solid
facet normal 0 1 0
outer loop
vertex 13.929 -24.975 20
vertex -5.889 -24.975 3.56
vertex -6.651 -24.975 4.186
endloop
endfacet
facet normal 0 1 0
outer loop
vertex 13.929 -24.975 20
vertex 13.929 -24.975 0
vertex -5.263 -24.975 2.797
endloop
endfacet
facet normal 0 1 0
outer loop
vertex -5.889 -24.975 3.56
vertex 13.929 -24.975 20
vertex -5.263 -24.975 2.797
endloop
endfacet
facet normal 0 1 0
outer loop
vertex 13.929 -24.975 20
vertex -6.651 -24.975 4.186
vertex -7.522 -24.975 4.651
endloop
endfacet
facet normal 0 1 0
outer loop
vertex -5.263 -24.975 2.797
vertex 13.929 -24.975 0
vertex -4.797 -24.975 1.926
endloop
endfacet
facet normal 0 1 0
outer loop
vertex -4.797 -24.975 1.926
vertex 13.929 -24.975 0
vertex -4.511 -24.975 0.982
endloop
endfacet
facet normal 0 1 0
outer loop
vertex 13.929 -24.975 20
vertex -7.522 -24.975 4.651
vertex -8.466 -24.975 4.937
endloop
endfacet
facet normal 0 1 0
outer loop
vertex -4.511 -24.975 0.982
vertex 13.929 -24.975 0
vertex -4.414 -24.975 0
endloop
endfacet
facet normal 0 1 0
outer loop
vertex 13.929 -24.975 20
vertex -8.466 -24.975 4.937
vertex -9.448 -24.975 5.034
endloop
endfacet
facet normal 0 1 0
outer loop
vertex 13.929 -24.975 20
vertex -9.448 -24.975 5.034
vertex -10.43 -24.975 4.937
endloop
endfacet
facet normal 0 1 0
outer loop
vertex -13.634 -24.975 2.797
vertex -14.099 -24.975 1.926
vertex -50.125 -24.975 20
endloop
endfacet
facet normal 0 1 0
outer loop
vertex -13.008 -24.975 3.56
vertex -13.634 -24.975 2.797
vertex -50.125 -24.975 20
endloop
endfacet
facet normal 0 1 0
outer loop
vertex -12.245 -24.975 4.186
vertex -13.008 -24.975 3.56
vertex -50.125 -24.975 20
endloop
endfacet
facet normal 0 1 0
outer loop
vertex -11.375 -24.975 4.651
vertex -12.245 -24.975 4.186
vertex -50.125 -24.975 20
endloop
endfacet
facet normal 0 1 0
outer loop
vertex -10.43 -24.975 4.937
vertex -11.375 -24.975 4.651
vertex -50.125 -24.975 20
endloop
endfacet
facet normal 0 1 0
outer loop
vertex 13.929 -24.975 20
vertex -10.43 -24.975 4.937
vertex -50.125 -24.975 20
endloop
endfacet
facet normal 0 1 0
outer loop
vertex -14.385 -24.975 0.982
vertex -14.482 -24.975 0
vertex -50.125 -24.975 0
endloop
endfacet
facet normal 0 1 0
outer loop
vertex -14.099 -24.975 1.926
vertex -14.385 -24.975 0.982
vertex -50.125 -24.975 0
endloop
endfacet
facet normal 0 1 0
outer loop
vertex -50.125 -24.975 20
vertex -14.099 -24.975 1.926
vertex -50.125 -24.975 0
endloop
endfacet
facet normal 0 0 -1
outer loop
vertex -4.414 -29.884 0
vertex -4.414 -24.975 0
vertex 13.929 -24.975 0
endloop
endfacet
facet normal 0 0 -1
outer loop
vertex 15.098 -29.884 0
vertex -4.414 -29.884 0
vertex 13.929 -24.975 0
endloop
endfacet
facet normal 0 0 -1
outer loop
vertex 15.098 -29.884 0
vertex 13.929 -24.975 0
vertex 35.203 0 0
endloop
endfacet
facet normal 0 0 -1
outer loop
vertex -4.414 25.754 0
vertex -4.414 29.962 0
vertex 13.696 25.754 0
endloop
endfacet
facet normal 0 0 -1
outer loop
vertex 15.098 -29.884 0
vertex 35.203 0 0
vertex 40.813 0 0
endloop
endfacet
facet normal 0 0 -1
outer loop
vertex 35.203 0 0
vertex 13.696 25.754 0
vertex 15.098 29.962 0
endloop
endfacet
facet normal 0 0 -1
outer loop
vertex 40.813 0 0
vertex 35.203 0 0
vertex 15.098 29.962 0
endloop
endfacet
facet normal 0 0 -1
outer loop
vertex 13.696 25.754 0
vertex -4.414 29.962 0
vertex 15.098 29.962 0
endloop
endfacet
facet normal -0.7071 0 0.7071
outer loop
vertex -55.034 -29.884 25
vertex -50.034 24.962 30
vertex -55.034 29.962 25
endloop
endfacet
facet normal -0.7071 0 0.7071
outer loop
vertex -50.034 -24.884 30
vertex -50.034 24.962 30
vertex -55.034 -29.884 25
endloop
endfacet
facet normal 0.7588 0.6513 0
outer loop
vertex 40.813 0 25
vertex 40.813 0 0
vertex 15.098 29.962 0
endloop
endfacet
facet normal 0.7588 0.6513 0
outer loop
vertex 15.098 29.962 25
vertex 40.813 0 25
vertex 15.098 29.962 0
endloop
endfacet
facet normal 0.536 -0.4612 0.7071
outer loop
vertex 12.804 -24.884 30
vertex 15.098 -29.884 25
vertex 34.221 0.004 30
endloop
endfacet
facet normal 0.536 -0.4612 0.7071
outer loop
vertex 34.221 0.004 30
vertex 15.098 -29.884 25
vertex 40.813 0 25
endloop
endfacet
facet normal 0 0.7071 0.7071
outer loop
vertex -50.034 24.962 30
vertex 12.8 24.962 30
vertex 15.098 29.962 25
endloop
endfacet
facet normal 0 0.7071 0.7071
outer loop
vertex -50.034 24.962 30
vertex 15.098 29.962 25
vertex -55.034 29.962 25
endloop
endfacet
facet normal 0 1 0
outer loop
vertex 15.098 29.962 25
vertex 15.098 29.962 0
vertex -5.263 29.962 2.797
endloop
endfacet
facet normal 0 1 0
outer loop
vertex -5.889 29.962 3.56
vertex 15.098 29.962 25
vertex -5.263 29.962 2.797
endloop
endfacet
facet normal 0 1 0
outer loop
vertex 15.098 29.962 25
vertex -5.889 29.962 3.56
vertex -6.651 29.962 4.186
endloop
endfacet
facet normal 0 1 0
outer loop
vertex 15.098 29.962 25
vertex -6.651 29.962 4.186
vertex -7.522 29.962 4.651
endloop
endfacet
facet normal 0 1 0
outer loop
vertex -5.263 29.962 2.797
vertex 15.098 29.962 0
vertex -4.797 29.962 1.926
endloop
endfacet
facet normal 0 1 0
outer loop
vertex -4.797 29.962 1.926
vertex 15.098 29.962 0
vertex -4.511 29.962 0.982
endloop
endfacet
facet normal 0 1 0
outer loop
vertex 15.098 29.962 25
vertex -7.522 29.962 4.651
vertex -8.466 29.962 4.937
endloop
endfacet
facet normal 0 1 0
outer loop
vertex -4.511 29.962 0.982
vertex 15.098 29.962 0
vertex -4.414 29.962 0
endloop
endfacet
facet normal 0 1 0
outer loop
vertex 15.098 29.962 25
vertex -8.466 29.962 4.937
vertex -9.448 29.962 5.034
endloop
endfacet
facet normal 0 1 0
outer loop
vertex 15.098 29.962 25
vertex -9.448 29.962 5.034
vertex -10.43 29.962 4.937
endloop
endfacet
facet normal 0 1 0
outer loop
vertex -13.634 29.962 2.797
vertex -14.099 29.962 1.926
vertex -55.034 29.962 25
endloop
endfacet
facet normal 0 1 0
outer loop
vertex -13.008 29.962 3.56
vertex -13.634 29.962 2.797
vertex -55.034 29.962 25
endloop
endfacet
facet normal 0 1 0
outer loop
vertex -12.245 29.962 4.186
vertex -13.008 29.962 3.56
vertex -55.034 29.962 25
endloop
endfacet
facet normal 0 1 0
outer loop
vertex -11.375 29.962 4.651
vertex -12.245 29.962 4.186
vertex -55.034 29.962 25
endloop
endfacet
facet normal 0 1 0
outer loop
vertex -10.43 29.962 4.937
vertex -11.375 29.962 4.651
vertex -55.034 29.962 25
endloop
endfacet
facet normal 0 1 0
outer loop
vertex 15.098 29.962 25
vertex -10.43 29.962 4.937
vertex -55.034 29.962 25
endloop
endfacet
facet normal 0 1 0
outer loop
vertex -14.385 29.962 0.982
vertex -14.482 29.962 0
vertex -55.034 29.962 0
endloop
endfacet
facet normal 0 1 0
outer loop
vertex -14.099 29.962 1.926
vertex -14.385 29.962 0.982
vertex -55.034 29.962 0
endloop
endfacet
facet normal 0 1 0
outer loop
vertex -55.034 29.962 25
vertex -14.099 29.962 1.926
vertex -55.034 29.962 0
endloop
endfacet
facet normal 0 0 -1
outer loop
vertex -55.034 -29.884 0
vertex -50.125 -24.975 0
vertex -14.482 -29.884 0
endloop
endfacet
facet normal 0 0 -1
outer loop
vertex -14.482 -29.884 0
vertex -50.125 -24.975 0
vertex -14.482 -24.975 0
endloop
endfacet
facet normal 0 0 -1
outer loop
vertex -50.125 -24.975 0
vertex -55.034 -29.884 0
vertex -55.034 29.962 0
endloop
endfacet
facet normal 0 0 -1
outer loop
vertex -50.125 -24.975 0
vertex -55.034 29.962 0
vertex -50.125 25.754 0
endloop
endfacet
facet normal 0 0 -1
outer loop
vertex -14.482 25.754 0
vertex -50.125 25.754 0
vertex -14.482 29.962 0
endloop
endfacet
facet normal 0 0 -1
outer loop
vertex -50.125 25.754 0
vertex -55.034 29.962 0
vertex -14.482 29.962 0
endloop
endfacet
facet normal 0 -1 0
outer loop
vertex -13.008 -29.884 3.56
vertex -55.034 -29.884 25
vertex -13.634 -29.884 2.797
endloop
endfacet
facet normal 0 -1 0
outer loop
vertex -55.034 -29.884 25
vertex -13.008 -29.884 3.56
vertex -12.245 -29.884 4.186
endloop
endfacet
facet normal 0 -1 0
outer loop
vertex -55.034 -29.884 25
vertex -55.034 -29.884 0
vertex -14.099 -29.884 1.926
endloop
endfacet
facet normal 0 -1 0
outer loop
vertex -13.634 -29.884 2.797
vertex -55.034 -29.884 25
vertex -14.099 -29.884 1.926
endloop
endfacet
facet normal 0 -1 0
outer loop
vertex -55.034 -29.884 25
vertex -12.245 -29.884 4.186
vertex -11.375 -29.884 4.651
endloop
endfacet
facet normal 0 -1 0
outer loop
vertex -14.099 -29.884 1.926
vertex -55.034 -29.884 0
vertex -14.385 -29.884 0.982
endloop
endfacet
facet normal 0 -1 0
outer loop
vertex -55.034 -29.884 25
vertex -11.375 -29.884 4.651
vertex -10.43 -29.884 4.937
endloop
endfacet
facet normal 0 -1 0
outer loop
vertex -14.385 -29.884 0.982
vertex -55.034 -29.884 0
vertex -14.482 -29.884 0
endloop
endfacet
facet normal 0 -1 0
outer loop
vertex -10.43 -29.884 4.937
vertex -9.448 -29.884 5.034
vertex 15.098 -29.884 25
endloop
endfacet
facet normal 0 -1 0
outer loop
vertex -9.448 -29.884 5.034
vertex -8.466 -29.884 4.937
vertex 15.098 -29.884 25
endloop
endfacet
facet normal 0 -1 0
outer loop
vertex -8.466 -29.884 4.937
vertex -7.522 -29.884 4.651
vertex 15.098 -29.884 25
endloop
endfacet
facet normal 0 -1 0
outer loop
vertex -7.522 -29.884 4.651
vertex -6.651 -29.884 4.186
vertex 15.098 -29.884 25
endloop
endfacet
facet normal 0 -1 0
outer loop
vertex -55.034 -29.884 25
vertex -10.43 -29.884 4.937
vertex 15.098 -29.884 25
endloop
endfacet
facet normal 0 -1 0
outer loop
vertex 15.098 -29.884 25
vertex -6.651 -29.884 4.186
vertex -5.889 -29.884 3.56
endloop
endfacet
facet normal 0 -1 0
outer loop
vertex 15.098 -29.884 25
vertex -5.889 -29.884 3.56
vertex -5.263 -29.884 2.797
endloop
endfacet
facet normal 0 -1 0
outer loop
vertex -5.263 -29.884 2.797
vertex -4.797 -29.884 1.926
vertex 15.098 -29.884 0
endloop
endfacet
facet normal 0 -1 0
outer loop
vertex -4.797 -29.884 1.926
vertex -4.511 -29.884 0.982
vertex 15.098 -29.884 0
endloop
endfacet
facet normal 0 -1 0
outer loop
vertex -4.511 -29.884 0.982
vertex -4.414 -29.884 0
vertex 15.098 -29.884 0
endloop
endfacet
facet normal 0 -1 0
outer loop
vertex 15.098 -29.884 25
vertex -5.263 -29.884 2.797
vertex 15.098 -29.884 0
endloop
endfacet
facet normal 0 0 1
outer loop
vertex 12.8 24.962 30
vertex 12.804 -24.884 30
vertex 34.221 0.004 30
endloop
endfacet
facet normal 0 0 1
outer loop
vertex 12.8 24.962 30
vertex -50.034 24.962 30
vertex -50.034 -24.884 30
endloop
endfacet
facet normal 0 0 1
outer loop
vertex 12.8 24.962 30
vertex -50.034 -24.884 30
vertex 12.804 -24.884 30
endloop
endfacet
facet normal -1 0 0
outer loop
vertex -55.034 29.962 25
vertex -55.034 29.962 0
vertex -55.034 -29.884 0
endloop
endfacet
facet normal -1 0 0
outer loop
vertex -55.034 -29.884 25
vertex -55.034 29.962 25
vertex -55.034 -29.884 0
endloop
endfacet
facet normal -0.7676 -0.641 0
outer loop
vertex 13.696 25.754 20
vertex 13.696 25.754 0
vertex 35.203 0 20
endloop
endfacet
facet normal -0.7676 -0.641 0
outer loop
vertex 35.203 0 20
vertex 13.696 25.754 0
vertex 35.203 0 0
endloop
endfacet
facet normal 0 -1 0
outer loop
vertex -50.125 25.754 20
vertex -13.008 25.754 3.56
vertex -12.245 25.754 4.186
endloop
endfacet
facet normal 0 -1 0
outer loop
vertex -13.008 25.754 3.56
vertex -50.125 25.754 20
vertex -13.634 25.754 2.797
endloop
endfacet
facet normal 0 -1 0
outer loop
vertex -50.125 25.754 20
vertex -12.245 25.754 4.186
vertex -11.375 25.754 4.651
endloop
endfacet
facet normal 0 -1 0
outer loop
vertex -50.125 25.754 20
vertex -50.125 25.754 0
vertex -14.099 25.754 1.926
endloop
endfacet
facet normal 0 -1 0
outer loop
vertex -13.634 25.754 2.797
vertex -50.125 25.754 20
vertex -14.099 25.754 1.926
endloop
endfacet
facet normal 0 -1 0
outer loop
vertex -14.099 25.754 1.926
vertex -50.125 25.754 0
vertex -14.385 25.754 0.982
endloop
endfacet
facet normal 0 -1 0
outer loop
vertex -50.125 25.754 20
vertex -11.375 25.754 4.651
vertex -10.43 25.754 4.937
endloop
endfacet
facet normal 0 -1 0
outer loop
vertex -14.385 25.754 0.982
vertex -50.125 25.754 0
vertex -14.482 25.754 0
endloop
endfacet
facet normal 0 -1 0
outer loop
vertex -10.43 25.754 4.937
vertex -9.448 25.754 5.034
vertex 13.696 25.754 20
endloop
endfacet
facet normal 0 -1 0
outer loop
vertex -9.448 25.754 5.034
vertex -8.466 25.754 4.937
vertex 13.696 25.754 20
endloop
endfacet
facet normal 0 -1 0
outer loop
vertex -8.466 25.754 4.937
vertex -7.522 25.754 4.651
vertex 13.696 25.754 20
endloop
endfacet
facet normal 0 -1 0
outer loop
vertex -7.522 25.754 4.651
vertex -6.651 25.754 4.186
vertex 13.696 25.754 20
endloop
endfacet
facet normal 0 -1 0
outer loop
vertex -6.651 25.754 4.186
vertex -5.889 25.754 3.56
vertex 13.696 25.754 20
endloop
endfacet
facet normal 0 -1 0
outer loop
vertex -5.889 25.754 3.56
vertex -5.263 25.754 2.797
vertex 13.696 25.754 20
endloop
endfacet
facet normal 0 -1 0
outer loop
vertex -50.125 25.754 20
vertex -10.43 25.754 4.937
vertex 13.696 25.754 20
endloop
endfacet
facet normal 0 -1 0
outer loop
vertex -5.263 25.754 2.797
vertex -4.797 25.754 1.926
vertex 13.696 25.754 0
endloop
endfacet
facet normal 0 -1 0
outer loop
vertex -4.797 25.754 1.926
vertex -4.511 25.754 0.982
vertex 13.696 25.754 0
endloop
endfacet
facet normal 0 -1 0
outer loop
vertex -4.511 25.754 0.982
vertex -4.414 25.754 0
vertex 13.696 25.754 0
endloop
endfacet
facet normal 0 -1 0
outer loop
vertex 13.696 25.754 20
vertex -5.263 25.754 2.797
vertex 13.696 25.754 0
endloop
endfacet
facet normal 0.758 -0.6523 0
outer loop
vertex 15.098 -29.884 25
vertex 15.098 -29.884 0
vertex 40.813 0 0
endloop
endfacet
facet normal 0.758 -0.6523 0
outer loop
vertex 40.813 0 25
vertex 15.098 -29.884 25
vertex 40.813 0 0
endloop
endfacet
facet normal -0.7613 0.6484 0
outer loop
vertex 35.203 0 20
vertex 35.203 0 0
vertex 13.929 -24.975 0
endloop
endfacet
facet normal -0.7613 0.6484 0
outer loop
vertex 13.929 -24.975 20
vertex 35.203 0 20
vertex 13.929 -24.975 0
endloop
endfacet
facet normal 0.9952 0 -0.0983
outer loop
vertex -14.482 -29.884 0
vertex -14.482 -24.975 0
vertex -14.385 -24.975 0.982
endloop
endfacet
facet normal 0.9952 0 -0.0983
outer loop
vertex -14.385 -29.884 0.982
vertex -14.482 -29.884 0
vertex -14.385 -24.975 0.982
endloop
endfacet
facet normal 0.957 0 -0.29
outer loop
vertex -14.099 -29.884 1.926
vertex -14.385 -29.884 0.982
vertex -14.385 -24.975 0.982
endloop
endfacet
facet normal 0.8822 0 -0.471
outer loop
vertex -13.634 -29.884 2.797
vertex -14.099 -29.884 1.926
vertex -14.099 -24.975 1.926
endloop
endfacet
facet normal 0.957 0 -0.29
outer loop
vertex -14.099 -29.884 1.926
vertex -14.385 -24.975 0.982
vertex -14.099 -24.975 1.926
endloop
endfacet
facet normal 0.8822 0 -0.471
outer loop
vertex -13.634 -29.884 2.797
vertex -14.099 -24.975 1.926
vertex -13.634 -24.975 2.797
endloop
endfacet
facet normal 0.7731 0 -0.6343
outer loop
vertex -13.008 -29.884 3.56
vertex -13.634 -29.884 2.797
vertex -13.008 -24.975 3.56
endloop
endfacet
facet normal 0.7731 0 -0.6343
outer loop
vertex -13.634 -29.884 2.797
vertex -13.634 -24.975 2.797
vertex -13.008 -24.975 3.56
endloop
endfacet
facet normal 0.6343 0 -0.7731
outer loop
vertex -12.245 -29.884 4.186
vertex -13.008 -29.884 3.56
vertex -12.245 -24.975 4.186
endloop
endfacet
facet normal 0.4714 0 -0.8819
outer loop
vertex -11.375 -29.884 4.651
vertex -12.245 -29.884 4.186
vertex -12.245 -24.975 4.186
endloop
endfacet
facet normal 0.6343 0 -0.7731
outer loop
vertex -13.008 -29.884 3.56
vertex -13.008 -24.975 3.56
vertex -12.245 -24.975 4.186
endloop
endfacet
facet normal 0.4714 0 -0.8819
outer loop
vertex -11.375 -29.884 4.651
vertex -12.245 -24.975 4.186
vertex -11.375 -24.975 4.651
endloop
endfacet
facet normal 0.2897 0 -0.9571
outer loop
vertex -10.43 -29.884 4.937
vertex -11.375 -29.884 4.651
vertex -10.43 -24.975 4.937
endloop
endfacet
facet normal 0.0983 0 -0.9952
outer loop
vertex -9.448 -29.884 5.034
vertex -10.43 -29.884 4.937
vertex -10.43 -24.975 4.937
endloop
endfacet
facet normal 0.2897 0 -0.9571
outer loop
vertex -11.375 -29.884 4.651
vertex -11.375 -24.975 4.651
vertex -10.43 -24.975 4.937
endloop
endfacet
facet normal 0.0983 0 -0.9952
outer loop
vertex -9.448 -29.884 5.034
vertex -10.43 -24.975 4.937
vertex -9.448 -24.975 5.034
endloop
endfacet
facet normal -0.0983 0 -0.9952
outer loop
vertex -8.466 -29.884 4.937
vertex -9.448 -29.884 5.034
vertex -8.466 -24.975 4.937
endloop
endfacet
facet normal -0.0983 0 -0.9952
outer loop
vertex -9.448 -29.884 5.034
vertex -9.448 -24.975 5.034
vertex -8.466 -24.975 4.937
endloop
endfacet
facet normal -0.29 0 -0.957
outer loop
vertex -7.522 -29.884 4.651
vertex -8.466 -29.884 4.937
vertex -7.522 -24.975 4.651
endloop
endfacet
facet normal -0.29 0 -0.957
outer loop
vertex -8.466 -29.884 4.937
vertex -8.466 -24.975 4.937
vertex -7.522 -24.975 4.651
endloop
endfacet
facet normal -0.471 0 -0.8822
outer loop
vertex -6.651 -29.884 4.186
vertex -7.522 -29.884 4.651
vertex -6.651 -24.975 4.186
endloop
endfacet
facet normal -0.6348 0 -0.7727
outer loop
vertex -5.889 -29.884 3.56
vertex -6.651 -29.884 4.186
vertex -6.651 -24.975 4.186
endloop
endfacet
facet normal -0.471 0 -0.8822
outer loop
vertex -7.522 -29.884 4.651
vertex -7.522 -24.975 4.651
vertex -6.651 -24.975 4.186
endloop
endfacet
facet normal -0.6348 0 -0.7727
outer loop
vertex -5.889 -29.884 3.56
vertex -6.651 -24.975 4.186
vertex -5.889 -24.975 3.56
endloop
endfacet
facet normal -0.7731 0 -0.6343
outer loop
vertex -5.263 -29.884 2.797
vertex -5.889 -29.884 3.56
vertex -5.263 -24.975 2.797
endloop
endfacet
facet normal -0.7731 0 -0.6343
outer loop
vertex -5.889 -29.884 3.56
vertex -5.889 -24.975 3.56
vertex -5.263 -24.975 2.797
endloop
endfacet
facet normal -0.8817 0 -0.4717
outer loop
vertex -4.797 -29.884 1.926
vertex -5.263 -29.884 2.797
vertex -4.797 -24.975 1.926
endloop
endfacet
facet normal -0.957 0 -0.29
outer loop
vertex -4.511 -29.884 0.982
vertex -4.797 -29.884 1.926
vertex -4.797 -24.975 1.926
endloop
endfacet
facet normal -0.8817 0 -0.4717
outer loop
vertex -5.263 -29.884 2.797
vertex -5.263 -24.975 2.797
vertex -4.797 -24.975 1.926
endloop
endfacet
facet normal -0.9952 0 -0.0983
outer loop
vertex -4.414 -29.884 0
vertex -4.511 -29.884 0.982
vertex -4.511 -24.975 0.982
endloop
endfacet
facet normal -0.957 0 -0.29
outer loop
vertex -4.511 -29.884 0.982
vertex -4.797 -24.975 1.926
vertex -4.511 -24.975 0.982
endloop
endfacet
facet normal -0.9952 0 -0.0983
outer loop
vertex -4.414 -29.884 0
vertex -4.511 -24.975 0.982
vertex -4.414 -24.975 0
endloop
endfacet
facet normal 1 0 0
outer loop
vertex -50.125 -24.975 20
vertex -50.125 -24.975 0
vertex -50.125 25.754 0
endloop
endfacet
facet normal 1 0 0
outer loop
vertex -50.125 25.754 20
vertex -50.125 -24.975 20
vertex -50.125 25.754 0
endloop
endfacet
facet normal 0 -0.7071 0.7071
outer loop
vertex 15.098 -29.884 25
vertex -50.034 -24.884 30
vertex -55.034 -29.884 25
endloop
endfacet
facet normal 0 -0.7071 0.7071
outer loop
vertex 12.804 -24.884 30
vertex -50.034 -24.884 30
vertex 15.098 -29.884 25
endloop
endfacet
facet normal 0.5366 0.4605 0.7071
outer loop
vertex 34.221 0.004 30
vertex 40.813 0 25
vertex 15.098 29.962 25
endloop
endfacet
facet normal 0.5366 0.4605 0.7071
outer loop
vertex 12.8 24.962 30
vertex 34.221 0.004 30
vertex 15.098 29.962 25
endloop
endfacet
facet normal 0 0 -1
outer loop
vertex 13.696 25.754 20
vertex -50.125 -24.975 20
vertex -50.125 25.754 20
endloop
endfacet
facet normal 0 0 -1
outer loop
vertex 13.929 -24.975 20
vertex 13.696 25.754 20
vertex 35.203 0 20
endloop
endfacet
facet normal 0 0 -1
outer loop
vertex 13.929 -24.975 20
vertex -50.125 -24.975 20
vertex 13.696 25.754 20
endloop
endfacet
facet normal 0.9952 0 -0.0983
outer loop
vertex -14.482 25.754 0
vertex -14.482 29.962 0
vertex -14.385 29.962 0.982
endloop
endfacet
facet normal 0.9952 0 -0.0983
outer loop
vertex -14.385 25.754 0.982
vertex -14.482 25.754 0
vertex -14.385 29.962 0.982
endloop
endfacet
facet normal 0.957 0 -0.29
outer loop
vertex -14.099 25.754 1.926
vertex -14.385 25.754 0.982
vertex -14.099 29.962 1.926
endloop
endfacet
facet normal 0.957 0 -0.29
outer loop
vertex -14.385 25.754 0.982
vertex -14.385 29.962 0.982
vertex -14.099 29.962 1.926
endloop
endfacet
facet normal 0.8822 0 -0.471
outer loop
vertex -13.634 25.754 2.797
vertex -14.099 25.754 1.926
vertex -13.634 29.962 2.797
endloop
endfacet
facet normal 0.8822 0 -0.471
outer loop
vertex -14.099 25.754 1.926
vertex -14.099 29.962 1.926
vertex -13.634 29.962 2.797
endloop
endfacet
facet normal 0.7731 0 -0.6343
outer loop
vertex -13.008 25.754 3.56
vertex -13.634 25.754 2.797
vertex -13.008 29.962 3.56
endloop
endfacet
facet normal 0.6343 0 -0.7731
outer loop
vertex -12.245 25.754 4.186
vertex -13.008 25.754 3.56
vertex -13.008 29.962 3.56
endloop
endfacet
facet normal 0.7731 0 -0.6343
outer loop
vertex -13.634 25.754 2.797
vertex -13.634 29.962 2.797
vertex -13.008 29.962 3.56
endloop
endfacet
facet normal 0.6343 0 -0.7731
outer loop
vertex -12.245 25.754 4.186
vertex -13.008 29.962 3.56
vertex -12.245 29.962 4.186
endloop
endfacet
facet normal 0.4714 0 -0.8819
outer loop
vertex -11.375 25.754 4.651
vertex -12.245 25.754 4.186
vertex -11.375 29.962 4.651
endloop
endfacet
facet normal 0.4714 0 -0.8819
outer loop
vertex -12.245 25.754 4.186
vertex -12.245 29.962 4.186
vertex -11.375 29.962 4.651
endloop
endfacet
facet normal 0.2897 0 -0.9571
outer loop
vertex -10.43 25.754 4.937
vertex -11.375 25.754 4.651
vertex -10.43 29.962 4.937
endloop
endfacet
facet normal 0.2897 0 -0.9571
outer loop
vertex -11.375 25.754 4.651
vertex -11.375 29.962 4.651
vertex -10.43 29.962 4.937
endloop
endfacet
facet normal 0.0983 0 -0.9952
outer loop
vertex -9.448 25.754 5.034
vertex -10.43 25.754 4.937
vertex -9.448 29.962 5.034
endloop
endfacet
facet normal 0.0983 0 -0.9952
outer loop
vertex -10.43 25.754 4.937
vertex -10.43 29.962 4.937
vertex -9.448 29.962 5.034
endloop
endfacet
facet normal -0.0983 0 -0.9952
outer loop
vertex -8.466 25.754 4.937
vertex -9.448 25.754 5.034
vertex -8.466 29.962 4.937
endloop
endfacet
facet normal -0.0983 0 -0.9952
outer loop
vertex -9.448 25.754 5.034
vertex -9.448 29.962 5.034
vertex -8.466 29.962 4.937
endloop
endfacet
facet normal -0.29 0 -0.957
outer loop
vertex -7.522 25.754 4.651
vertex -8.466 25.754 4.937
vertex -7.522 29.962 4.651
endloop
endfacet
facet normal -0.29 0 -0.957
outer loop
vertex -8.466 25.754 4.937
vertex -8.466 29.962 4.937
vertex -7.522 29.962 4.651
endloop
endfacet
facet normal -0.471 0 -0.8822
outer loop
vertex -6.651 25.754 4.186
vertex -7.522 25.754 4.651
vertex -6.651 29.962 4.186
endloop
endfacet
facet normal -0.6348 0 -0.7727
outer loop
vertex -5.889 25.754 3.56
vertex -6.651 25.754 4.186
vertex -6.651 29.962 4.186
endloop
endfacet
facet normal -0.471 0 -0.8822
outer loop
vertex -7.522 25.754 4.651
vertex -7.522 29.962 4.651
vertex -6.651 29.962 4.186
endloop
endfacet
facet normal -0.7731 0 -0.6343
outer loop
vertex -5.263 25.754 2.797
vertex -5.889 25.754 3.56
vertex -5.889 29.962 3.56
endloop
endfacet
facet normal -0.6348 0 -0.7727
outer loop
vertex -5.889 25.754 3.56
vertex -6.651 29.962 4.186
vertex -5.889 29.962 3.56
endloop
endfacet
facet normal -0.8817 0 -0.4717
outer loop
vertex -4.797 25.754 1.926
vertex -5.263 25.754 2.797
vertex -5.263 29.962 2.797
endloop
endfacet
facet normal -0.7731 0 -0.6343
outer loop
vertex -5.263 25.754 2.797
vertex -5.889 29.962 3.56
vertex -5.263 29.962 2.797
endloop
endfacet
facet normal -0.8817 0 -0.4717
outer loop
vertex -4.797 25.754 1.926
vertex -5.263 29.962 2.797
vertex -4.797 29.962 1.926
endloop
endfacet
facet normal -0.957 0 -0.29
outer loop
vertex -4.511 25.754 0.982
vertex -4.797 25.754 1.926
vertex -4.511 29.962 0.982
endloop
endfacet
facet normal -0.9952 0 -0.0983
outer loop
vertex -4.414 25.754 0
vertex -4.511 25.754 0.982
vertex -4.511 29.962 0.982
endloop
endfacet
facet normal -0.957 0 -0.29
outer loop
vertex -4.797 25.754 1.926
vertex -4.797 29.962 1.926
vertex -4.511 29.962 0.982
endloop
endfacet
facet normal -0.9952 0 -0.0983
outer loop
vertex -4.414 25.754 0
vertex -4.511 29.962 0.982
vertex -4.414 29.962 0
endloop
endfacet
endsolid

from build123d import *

# Parameters (mm, degrees)
F1_DEPTH = 30
F3_DEPTH = 20
F4_SIZE  = 5
F6_DEPTH = 100


with BuildPart() as f1:
    # F0 (on Top) → F1 (new body)
    with BuildSketch(Plane.XY):
        Polygon((-55.034131, 29.962024), (-55.034131, 0), (-55.034131, -29.884199), (15.098164, -29.884199), (40.813338, 0), (15.098164, 29.962024), align=None)
    extrude(amount=F1_DEPTH)

    # F2 (on face) → F3 (cut)
    with BuildSketch(Plane(origin=(0, 0, 0), x_dir=(1, 0, 0), z_dir=(0, 0, -1))):
        Polygon((35.202757, 0), (13.929292, 24.974938), (-50.124869, 24.974938), (-50.124869, -25.754089), (13.695518, -25.754089), align=None)
    extrude(amount=-F3_DEPTH, mode=Mode.SUBTRACT)

    # F4
    f4_edges = [f1.edges().sort_by_distance(p)[0] for p in [
        (27.955751, -14.942099, 30),
        (27.955751, 14.981012, 30),
        (-19.967983, 29.962024, 30),
        (-19.967983, -29.884199, 30),
        (-55.034131, 0.038913, 30),
    ]]
    chamfer(f4_edges, length=F4_SIZE)

    # F5 (on face) → F6 (cut)
    with BuildSketch(Plane(origin=(0, 29.962024, 0), x_dir=(-1, 0, 0), z_dir=(0, 1, 0))):
        with BuildLine():
            Line((4.414184, 0), (14.482094, 0))
            ThreePointArc((14.482094, 0), (9.448139, 5.033955), (4.414184, 0))
        make_face()
    extrude(amount=-F6_DEPTH, mode=Mode.SUBTRACT)


solid = f1.part
